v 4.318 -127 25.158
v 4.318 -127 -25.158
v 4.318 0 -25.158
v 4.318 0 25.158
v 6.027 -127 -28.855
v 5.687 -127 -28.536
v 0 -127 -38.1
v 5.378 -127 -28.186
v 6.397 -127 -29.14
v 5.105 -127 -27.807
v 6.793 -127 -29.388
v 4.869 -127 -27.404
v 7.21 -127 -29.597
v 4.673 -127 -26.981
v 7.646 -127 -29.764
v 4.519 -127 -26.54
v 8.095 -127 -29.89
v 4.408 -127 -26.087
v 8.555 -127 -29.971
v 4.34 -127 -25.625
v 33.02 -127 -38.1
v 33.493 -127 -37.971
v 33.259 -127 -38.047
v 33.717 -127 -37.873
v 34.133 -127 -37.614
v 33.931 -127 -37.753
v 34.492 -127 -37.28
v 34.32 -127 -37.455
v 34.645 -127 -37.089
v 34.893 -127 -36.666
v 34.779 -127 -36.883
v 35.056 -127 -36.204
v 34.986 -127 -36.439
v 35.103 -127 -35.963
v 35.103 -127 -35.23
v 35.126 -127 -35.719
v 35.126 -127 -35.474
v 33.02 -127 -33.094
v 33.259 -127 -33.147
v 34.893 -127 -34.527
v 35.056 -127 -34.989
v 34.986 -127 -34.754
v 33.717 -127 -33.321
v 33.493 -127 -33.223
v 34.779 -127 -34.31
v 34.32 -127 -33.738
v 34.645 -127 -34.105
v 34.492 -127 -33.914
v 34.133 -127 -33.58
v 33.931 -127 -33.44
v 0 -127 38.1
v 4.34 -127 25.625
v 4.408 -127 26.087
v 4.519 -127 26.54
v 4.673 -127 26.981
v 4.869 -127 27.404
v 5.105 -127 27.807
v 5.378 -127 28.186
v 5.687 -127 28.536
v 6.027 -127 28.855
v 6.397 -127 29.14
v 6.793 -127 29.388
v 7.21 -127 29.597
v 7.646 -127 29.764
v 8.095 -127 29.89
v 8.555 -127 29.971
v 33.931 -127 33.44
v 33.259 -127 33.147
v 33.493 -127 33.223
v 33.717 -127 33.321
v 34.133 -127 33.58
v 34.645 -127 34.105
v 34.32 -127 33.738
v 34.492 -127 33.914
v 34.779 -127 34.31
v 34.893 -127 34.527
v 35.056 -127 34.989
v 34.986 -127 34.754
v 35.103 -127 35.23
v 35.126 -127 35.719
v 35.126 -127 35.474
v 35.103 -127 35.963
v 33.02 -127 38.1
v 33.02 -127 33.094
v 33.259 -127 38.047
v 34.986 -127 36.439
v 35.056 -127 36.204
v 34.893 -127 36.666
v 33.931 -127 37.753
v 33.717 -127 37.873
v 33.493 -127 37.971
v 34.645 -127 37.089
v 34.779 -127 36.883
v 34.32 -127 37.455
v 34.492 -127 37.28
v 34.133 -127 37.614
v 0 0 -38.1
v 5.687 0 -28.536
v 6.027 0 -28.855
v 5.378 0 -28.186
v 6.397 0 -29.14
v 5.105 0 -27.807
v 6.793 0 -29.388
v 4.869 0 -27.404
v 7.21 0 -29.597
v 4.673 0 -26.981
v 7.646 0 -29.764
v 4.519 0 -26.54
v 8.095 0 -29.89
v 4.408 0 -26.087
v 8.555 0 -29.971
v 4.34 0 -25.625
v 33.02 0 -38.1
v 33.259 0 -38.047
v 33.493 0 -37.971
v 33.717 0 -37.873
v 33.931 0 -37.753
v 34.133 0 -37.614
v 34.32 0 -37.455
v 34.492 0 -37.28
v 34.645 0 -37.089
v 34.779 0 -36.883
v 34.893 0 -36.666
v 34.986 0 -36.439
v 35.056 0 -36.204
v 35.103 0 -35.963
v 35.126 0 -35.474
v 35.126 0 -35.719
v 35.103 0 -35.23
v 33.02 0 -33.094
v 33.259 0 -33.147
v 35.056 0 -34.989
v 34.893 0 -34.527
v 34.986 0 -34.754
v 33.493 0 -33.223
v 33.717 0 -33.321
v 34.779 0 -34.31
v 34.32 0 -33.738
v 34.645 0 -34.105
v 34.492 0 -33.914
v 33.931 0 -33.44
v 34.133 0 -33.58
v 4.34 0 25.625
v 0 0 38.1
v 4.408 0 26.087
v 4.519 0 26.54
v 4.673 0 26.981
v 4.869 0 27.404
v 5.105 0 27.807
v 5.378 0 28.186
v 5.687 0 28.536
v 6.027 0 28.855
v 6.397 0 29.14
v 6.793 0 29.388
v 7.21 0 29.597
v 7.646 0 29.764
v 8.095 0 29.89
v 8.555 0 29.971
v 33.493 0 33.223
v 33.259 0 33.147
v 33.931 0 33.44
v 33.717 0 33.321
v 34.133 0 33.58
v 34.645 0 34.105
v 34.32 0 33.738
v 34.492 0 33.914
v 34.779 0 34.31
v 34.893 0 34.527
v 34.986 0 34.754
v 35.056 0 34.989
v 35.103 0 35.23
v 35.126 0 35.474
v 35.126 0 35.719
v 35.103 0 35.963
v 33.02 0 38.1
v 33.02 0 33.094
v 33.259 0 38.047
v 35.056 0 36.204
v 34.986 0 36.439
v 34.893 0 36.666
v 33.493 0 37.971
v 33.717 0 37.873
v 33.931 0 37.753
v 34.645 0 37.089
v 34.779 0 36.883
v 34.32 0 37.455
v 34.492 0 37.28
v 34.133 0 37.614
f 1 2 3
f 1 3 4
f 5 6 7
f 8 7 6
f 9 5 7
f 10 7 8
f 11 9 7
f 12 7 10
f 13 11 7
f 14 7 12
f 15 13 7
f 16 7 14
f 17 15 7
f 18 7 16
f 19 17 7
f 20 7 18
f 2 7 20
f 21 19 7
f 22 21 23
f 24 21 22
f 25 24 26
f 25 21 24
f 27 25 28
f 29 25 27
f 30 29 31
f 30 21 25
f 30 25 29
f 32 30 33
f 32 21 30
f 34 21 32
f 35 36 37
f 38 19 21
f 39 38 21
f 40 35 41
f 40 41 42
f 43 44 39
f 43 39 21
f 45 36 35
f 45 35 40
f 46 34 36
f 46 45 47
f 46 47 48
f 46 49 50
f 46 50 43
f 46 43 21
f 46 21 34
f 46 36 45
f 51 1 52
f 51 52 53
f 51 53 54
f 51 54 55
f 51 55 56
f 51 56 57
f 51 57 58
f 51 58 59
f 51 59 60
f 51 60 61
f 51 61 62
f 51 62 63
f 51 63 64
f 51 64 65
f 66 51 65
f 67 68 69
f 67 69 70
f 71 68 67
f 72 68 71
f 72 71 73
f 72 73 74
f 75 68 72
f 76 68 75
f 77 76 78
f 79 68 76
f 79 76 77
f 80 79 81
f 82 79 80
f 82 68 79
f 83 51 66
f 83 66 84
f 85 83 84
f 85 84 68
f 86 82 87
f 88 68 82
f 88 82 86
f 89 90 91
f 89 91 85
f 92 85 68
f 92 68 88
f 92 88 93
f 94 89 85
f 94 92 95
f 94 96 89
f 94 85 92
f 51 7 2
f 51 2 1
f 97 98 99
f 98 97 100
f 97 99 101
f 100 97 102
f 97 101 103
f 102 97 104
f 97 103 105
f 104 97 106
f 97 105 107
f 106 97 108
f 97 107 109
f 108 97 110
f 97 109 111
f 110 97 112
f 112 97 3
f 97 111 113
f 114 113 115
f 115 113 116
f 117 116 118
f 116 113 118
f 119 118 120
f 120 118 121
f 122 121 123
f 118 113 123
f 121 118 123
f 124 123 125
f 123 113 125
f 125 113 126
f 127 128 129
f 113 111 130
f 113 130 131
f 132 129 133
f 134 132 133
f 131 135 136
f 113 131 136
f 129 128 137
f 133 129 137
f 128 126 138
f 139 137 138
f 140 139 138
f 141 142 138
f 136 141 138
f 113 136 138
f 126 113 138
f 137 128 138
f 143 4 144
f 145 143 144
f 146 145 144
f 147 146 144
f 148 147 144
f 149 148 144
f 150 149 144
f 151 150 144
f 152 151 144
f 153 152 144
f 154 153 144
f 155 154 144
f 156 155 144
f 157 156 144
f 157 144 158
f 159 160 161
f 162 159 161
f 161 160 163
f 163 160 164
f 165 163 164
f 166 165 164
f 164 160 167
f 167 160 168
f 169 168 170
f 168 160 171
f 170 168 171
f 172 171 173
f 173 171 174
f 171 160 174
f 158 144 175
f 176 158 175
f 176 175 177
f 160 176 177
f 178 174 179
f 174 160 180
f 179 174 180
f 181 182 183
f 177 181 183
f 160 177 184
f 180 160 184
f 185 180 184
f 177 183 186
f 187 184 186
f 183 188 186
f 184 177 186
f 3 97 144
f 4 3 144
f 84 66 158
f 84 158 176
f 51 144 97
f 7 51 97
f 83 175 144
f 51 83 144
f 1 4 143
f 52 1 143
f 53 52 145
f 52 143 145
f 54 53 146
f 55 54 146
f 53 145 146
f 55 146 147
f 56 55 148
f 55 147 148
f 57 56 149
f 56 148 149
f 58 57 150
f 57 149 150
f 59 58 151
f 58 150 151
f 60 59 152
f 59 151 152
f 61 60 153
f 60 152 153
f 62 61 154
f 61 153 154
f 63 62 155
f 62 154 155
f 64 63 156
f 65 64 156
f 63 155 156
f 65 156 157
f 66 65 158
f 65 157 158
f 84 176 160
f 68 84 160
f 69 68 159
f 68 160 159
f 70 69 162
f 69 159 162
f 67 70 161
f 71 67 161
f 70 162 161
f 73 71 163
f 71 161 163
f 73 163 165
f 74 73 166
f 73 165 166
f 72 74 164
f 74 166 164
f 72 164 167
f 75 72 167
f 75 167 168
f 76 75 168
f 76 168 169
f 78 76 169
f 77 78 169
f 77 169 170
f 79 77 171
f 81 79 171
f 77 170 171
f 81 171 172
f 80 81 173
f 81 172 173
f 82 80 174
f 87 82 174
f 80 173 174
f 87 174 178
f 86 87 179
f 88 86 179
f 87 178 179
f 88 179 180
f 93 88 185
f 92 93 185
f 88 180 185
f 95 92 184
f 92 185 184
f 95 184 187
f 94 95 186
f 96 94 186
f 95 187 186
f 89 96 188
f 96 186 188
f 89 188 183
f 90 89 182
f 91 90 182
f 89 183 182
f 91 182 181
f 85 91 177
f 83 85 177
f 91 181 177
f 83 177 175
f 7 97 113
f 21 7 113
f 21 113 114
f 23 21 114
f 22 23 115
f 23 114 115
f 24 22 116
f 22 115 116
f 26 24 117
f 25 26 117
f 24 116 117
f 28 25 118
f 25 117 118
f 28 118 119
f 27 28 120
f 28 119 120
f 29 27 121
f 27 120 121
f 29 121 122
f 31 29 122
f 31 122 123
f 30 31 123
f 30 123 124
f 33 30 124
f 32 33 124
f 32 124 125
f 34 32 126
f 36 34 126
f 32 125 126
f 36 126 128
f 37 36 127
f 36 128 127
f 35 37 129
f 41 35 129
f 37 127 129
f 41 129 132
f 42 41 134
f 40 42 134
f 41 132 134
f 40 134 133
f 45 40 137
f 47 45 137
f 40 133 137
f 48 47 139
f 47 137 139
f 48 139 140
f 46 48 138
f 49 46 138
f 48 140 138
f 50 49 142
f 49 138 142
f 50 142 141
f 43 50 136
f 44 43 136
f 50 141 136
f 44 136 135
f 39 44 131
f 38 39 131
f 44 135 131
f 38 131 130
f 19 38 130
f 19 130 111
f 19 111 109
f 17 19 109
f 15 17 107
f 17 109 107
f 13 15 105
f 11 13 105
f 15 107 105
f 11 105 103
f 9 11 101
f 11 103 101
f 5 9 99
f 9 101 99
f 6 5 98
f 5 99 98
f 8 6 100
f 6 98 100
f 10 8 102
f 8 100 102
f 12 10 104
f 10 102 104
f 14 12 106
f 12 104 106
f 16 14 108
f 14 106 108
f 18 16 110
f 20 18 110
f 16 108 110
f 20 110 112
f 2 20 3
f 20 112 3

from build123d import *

# Parameters (mm, degrees)
F1_DEPTH = 127


with BuildPart() as f1:
    # F0 (on Front) → F1 (new body)
    with BuildSketch(Plane.XZ):
        with BuildLine():
            Line((0, 38.1), (0, -38.1))
            Line((0, -38.1), (33.02, -38.1))
            ThreePointArc((33.02, -38.1), (35.12925, -35.596791), (33.02, -33.093582))
            Line((33.02, -33.093582), (8.555139, -29.970825))
            ThreePointArc((8.555139, -29.970825), (5.528239, -28.364406), (4.318, -25.158469))
            Line((4.318, -25.158469), (4.318, 0))
            Line((4.318, 0), (4.318, 25.158469))
            ThreePointArc((4.318, 25.158469), (5.528239, 28.364406), (8.555139, 29.970825))
            Line((8.555139, 29.970825), (33.02, 33.093582))
            ThreePointArc((33.02, 33.093582), (35.12925, 35.596791), (33.02, 38.1))
            Line((33.02, 38.1), (0, 38.1))
        make_face()
    extrude(amount=F1_DEPTH)


solid = f1.part
